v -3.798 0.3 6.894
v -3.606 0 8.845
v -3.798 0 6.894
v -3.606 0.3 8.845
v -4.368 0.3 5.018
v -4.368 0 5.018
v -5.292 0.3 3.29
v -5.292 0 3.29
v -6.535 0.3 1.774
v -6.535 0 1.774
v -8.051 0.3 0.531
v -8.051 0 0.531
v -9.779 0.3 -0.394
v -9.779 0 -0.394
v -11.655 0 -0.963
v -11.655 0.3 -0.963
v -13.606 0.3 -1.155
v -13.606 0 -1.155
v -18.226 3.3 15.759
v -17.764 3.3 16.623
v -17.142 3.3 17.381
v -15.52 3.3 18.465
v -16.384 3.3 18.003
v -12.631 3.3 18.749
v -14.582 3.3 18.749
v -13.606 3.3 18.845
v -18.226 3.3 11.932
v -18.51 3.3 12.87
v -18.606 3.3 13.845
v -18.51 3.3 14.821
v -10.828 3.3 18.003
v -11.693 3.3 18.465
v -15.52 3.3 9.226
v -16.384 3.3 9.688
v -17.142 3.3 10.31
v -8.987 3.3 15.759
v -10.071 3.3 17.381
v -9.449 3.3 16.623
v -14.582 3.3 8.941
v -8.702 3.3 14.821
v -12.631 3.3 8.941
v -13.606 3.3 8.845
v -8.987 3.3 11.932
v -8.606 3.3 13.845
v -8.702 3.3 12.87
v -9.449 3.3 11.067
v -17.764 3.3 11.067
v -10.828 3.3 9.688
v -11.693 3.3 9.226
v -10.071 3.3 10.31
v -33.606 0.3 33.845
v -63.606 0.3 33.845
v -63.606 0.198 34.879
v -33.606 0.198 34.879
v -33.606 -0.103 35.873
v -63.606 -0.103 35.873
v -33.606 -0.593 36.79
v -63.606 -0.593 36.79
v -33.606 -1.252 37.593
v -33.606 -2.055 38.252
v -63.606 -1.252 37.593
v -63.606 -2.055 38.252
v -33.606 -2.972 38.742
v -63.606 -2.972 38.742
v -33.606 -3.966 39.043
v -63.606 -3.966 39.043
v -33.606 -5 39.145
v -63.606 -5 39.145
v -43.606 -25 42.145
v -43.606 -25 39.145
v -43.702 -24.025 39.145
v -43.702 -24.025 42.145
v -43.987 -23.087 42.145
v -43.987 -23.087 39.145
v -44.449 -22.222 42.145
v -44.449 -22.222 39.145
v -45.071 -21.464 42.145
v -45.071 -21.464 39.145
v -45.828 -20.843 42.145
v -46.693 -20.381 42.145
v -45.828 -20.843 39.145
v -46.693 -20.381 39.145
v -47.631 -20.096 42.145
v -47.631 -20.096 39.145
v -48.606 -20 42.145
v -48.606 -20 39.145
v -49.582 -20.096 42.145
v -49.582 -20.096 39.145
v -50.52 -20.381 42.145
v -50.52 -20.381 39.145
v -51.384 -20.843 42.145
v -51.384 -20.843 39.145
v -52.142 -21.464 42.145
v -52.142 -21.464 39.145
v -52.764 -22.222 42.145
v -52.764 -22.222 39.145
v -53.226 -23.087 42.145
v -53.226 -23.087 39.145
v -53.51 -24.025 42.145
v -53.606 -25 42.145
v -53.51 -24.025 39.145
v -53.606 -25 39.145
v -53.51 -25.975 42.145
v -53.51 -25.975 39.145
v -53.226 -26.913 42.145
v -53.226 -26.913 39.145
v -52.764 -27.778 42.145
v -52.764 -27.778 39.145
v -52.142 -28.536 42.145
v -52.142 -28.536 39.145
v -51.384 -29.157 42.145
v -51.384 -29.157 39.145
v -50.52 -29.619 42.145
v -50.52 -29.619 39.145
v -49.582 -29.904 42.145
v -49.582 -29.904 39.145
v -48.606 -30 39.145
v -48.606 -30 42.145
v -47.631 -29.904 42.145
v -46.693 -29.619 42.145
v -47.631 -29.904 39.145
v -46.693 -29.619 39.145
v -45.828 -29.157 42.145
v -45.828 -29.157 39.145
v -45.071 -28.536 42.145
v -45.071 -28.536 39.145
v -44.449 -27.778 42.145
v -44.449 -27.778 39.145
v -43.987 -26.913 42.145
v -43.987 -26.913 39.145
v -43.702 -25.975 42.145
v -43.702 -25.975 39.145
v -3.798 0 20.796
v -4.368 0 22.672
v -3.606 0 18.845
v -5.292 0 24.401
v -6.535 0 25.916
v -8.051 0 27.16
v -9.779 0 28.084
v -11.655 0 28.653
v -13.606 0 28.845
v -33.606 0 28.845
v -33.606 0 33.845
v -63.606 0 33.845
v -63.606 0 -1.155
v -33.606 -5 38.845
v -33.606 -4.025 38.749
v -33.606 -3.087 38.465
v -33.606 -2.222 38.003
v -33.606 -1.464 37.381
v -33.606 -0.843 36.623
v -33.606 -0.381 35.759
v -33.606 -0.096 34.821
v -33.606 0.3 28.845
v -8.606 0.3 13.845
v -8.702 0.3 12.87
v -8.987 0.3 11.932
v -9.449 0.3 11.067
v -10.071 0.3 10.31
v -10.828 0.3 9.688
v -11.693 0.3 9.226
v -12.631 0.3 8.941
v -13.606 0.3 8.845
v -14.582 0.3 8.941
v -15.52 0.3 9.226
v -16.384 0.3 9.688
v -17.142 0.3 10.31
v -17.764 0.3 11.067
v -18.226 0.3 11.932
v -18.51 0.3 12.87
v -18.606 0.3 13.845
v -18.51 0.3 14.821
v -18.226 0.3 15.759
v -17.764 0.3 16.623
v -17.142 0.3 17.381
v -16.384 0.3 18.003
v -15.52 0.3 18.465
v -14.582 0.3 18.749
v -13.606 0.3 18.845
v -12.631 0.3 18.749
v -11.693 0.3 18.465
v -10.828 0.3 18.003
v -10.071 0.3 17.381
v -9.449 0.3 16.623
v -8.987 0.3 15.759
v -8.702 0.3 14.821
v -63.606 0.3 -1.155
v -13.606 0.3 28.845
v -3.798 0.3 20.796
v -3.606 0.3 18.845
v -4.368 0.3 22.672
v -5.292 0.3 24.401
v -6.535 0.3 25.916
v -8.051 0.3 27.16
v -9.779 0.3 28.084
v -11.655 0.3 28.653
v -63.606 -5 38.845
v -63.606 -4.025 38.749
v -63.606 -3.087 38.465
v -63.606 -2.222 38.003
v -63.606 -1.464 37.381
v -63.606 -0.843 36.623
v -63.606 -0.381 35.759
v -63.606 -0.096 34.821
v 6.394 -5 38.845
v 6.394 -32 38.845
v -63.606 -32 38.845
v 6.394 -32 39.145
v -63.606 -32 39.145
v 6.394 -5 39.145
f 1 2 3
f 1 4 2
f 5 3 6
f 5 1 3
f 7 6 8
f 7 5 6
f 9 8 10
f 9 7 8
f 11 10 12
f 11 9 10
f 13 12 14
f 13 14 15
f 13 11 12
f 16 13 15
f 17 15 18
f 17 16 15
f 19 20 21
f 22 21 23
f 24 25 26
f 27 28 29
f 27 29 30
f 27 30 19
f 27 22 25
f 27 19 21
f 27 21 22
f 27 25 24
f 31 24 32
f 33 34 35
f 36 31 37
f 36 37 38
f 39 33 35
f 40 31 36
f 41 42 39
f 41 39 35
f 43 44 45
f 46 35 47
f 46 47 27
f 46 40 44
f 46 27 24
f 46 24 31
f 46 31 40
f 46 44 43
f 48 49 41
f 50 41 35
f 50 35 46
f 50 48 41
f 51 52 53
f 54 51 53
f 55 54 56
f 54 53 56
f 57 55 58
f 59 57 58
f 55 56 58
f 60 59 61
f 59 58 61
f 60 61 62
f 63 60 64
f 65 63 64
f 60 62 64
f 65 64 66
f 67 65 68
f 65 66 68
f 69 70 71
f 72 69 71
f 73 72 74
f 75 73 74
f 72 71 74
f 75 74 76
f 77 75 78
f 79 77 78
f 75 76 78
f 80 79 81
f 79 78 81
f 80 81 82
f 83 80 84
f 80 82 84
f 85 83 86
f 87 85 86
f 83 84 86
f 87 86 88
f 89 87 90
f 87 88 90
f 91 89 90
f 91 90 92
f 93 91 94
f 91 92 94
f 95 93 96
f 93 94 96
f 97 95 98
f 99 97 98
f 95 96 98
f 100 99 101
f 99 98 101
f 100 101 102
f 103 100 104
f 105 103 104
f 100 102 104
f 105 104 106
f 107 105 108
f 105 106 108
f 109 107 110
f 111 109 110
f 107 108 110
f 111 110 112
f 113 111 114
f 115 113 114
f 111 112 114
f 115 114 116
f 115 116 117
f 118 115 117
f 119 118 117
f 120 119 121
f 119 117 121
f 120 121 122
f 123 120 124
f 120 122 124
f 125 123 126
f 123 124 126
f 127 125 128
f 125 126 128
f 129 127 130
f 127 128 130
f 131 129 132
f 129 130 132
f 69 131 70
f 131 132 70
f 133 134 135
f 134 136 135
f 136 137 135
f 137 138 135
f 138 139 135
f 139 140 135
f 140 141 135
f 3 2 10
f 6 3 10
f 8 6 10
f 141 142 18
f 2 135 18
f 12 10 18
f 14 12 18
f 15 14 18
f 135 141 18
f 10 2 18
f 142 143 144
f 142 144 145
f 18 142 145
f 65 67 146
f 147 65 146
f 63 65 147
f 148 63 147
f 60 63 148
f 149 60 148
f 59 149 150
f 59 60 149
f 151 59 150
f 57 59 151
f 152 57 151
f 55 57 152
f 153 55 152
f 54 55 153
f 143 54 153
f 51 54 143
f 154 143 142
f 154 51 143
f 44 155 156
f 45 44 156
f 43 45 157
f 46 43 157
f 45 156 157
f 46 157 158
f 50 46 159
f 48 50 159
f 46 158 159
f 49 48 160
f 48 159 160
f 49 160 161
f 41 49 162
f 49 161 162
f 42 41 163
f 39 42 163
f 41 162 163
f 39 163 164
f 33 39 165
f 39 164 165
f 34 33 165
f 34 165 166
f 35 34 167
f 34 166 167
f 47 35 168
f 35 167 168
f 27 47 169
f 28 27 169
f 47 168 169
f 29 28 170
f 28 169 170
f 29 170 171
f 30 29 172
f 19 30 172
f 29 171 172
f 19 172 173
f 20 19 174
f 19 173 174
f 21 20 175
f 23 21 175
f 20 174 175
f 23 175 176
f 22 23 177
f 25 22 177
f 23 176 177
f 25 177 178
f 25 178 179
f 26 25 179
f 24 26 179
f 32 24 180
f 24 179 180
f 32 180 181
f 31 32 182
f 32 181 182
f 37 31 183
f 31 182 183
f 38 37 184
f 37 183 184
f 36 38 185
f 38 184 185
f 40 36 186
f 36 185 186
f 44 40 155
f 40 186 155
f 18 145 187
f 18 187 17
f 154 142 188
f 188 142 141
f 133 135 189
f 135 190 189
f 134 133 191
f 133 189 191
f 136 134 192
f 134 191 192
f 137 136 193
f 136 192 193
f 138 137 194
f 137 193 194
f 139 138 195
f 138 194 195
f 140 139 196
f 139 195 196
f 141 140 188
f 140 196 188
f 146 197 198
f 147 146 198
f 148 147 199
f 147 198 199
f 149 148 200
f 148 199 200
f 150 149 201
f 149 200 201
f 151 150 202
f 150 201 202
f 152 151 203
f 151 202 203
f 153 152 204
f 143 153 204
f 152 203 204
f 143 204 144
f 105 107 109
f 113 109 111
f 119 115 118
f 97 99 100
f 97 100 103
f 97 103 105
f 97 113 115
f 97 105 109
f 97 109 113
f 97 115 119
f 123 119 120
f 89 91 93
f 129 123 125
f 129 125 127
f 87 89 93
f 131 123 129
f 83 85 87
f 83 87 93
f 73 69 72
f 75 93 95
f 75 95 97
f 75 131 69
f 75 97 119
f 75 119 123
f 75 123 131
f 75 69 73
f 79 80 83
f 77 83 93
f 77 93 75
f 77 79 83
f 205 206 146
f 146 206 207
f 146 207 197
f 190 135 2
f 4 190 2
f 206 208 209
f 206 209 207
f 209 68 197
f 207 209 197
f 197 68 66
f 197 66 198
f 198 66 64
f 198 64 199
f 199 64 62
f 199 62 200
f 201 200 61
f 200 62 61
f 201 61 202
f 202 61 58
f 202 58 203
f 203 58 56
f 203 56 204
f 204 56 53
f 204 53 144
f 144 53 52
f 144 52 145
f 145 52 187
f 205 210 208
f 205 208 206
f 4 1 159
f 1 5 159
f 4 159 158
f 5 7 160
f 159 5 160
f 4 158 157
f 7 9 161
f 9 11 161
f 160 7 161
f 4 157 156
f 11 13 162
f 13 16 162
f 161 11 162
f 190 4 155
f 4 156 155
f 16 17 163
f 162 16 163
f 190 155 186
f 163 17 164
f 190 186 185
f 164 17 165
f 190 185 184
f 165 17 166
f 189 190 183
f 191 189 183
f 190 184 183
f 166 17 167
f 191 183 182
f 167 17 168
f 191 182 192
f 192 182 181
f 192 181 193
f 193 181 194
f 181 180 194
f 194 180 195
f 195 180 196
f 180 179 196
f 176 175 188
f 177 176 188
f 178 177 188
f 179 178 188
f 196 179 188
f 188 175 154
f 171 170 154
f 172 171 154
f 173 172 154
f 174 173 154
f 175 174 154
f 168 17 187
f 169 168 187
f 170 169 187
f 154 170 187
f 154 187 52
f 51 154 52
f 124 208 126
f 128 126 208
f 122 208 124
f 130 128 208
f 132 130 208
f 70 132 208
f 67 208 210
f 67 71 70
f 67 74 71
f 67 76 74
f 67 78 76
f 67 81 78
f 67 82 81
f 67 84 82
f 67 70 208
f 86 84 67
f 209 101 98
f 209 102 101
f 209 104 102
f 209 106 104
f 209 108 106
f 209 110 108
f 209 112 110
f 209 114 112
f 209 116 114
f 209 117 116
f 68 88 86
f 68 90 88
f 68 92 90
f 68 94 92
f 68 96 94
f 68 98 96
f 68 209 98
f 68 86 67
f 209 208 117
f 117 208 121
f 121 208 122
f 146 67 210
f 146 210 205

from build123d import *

# Parameters (mm, degrees)
SKETCH1_W           = 60
SKETCH1_H           = 30
BOSS_EXTRUDE1_DEPTH = 0.3
BOSS_EXTRUDE3_DEPTH = 30
SKETCH7_R           = 5
BOSS_EXTRUDE4_DEPTH = 3
SKETCH8_R           = 5
BOSS_EXTRUDE5_DEPTH = 3
SKETCH9_W           = 0.3
SKETCH9_H           = 27
BOSS_EXTRUDE6_DEPTH = 40
FILLET1_R           = 10


with BuildPart() as part:
    # Sketch1 → Boss-Extrude1 (new body)
    with BuildSketch(Plane(origin=(0, 0, 0), x_dir=(1, 0, 0), z_dir=(0, 1, 0))):
        with Locations((-33.606331541, -13.845258597)):
            Rectangle(SKETCH1_W, SKETCH1_H)
    extrude(amount=BOSS_EXTRUDE1_DEPTH)

    # Sketch6 → Boss-Extrude3 (add)
    with BuildSketch(Plane.ZY.offset(63.606331541)):
        with BuildLine():
            Line((28.845258597, 0.3), (33.845258597, 0.3))
            ThreePointArc((33.845258597, 0.3), (37.592924537, -1.25233406), (39.145258597, -5))
            Line((39.145258597, -5), (39.145258597, -32))
            Line((39.145258597, -32), (38.845258597, -32))
            Line((38.845258597, -32), (38.845258597, -5))
            ThreePointArc((38.845258597, -5), (37.380792503, -1.464466094), (33.845258597, 0))
            Line((33.845258597, 0), (28.845258597, 0))
            Line((28.845258597, 0), (28.845258597, 0.3))
        make_face()
    extrude(amount=-BOSS_EXTRUDE3_DEPTH)

    # Sketch7 → Boss-Extrude4 (add)
    with BuildSketch(Plane.XY.offset(39.145258597)):
        with Locations((-48.606331541, -25)):
            Circle(SKETCH7_R)
    extrude(amount=BOSS_EXTRUDE4_DEPTH)

    # Sketch8 → Boss-Extrude5 (add)
    with BuildSketch(Plane(origin=(0, 0.3, 0), x_dir=(1, 0, 0), z_dir=(0, 1, 0))):
        with Locations((-13.606331541, -13.845258597)):
            Circle(SKETCH8_R)
    extrude(amount=BOSS_EXTRUDE5_DEPTH)

    # Sketch9 → Boss-Extrude6 (add)
    with BuildSketch(Plane(origin=(-33.606331541, 0, 0), x_dir=(0, 0, -1), z_dir=(1, 0, 0))):
        with Locations((-38.995258597, -18.5)):
            Rectangle(SKETCH9_W, SKETCH9_H)
    extrude(amount=BOSS_EXTRUDE6_DEPTH)

    # Fillet1
    fillet1_edges = [part.edges().sort_by_distance(p)[0] for p in [
        (-3.606331541, 0.15, 28.845258597),
        (-3.606331541, 0.15, -1.154741403),
    ]]
    fillet(fillet1_edges, radius=FILLET1_R)


solid = part.part
